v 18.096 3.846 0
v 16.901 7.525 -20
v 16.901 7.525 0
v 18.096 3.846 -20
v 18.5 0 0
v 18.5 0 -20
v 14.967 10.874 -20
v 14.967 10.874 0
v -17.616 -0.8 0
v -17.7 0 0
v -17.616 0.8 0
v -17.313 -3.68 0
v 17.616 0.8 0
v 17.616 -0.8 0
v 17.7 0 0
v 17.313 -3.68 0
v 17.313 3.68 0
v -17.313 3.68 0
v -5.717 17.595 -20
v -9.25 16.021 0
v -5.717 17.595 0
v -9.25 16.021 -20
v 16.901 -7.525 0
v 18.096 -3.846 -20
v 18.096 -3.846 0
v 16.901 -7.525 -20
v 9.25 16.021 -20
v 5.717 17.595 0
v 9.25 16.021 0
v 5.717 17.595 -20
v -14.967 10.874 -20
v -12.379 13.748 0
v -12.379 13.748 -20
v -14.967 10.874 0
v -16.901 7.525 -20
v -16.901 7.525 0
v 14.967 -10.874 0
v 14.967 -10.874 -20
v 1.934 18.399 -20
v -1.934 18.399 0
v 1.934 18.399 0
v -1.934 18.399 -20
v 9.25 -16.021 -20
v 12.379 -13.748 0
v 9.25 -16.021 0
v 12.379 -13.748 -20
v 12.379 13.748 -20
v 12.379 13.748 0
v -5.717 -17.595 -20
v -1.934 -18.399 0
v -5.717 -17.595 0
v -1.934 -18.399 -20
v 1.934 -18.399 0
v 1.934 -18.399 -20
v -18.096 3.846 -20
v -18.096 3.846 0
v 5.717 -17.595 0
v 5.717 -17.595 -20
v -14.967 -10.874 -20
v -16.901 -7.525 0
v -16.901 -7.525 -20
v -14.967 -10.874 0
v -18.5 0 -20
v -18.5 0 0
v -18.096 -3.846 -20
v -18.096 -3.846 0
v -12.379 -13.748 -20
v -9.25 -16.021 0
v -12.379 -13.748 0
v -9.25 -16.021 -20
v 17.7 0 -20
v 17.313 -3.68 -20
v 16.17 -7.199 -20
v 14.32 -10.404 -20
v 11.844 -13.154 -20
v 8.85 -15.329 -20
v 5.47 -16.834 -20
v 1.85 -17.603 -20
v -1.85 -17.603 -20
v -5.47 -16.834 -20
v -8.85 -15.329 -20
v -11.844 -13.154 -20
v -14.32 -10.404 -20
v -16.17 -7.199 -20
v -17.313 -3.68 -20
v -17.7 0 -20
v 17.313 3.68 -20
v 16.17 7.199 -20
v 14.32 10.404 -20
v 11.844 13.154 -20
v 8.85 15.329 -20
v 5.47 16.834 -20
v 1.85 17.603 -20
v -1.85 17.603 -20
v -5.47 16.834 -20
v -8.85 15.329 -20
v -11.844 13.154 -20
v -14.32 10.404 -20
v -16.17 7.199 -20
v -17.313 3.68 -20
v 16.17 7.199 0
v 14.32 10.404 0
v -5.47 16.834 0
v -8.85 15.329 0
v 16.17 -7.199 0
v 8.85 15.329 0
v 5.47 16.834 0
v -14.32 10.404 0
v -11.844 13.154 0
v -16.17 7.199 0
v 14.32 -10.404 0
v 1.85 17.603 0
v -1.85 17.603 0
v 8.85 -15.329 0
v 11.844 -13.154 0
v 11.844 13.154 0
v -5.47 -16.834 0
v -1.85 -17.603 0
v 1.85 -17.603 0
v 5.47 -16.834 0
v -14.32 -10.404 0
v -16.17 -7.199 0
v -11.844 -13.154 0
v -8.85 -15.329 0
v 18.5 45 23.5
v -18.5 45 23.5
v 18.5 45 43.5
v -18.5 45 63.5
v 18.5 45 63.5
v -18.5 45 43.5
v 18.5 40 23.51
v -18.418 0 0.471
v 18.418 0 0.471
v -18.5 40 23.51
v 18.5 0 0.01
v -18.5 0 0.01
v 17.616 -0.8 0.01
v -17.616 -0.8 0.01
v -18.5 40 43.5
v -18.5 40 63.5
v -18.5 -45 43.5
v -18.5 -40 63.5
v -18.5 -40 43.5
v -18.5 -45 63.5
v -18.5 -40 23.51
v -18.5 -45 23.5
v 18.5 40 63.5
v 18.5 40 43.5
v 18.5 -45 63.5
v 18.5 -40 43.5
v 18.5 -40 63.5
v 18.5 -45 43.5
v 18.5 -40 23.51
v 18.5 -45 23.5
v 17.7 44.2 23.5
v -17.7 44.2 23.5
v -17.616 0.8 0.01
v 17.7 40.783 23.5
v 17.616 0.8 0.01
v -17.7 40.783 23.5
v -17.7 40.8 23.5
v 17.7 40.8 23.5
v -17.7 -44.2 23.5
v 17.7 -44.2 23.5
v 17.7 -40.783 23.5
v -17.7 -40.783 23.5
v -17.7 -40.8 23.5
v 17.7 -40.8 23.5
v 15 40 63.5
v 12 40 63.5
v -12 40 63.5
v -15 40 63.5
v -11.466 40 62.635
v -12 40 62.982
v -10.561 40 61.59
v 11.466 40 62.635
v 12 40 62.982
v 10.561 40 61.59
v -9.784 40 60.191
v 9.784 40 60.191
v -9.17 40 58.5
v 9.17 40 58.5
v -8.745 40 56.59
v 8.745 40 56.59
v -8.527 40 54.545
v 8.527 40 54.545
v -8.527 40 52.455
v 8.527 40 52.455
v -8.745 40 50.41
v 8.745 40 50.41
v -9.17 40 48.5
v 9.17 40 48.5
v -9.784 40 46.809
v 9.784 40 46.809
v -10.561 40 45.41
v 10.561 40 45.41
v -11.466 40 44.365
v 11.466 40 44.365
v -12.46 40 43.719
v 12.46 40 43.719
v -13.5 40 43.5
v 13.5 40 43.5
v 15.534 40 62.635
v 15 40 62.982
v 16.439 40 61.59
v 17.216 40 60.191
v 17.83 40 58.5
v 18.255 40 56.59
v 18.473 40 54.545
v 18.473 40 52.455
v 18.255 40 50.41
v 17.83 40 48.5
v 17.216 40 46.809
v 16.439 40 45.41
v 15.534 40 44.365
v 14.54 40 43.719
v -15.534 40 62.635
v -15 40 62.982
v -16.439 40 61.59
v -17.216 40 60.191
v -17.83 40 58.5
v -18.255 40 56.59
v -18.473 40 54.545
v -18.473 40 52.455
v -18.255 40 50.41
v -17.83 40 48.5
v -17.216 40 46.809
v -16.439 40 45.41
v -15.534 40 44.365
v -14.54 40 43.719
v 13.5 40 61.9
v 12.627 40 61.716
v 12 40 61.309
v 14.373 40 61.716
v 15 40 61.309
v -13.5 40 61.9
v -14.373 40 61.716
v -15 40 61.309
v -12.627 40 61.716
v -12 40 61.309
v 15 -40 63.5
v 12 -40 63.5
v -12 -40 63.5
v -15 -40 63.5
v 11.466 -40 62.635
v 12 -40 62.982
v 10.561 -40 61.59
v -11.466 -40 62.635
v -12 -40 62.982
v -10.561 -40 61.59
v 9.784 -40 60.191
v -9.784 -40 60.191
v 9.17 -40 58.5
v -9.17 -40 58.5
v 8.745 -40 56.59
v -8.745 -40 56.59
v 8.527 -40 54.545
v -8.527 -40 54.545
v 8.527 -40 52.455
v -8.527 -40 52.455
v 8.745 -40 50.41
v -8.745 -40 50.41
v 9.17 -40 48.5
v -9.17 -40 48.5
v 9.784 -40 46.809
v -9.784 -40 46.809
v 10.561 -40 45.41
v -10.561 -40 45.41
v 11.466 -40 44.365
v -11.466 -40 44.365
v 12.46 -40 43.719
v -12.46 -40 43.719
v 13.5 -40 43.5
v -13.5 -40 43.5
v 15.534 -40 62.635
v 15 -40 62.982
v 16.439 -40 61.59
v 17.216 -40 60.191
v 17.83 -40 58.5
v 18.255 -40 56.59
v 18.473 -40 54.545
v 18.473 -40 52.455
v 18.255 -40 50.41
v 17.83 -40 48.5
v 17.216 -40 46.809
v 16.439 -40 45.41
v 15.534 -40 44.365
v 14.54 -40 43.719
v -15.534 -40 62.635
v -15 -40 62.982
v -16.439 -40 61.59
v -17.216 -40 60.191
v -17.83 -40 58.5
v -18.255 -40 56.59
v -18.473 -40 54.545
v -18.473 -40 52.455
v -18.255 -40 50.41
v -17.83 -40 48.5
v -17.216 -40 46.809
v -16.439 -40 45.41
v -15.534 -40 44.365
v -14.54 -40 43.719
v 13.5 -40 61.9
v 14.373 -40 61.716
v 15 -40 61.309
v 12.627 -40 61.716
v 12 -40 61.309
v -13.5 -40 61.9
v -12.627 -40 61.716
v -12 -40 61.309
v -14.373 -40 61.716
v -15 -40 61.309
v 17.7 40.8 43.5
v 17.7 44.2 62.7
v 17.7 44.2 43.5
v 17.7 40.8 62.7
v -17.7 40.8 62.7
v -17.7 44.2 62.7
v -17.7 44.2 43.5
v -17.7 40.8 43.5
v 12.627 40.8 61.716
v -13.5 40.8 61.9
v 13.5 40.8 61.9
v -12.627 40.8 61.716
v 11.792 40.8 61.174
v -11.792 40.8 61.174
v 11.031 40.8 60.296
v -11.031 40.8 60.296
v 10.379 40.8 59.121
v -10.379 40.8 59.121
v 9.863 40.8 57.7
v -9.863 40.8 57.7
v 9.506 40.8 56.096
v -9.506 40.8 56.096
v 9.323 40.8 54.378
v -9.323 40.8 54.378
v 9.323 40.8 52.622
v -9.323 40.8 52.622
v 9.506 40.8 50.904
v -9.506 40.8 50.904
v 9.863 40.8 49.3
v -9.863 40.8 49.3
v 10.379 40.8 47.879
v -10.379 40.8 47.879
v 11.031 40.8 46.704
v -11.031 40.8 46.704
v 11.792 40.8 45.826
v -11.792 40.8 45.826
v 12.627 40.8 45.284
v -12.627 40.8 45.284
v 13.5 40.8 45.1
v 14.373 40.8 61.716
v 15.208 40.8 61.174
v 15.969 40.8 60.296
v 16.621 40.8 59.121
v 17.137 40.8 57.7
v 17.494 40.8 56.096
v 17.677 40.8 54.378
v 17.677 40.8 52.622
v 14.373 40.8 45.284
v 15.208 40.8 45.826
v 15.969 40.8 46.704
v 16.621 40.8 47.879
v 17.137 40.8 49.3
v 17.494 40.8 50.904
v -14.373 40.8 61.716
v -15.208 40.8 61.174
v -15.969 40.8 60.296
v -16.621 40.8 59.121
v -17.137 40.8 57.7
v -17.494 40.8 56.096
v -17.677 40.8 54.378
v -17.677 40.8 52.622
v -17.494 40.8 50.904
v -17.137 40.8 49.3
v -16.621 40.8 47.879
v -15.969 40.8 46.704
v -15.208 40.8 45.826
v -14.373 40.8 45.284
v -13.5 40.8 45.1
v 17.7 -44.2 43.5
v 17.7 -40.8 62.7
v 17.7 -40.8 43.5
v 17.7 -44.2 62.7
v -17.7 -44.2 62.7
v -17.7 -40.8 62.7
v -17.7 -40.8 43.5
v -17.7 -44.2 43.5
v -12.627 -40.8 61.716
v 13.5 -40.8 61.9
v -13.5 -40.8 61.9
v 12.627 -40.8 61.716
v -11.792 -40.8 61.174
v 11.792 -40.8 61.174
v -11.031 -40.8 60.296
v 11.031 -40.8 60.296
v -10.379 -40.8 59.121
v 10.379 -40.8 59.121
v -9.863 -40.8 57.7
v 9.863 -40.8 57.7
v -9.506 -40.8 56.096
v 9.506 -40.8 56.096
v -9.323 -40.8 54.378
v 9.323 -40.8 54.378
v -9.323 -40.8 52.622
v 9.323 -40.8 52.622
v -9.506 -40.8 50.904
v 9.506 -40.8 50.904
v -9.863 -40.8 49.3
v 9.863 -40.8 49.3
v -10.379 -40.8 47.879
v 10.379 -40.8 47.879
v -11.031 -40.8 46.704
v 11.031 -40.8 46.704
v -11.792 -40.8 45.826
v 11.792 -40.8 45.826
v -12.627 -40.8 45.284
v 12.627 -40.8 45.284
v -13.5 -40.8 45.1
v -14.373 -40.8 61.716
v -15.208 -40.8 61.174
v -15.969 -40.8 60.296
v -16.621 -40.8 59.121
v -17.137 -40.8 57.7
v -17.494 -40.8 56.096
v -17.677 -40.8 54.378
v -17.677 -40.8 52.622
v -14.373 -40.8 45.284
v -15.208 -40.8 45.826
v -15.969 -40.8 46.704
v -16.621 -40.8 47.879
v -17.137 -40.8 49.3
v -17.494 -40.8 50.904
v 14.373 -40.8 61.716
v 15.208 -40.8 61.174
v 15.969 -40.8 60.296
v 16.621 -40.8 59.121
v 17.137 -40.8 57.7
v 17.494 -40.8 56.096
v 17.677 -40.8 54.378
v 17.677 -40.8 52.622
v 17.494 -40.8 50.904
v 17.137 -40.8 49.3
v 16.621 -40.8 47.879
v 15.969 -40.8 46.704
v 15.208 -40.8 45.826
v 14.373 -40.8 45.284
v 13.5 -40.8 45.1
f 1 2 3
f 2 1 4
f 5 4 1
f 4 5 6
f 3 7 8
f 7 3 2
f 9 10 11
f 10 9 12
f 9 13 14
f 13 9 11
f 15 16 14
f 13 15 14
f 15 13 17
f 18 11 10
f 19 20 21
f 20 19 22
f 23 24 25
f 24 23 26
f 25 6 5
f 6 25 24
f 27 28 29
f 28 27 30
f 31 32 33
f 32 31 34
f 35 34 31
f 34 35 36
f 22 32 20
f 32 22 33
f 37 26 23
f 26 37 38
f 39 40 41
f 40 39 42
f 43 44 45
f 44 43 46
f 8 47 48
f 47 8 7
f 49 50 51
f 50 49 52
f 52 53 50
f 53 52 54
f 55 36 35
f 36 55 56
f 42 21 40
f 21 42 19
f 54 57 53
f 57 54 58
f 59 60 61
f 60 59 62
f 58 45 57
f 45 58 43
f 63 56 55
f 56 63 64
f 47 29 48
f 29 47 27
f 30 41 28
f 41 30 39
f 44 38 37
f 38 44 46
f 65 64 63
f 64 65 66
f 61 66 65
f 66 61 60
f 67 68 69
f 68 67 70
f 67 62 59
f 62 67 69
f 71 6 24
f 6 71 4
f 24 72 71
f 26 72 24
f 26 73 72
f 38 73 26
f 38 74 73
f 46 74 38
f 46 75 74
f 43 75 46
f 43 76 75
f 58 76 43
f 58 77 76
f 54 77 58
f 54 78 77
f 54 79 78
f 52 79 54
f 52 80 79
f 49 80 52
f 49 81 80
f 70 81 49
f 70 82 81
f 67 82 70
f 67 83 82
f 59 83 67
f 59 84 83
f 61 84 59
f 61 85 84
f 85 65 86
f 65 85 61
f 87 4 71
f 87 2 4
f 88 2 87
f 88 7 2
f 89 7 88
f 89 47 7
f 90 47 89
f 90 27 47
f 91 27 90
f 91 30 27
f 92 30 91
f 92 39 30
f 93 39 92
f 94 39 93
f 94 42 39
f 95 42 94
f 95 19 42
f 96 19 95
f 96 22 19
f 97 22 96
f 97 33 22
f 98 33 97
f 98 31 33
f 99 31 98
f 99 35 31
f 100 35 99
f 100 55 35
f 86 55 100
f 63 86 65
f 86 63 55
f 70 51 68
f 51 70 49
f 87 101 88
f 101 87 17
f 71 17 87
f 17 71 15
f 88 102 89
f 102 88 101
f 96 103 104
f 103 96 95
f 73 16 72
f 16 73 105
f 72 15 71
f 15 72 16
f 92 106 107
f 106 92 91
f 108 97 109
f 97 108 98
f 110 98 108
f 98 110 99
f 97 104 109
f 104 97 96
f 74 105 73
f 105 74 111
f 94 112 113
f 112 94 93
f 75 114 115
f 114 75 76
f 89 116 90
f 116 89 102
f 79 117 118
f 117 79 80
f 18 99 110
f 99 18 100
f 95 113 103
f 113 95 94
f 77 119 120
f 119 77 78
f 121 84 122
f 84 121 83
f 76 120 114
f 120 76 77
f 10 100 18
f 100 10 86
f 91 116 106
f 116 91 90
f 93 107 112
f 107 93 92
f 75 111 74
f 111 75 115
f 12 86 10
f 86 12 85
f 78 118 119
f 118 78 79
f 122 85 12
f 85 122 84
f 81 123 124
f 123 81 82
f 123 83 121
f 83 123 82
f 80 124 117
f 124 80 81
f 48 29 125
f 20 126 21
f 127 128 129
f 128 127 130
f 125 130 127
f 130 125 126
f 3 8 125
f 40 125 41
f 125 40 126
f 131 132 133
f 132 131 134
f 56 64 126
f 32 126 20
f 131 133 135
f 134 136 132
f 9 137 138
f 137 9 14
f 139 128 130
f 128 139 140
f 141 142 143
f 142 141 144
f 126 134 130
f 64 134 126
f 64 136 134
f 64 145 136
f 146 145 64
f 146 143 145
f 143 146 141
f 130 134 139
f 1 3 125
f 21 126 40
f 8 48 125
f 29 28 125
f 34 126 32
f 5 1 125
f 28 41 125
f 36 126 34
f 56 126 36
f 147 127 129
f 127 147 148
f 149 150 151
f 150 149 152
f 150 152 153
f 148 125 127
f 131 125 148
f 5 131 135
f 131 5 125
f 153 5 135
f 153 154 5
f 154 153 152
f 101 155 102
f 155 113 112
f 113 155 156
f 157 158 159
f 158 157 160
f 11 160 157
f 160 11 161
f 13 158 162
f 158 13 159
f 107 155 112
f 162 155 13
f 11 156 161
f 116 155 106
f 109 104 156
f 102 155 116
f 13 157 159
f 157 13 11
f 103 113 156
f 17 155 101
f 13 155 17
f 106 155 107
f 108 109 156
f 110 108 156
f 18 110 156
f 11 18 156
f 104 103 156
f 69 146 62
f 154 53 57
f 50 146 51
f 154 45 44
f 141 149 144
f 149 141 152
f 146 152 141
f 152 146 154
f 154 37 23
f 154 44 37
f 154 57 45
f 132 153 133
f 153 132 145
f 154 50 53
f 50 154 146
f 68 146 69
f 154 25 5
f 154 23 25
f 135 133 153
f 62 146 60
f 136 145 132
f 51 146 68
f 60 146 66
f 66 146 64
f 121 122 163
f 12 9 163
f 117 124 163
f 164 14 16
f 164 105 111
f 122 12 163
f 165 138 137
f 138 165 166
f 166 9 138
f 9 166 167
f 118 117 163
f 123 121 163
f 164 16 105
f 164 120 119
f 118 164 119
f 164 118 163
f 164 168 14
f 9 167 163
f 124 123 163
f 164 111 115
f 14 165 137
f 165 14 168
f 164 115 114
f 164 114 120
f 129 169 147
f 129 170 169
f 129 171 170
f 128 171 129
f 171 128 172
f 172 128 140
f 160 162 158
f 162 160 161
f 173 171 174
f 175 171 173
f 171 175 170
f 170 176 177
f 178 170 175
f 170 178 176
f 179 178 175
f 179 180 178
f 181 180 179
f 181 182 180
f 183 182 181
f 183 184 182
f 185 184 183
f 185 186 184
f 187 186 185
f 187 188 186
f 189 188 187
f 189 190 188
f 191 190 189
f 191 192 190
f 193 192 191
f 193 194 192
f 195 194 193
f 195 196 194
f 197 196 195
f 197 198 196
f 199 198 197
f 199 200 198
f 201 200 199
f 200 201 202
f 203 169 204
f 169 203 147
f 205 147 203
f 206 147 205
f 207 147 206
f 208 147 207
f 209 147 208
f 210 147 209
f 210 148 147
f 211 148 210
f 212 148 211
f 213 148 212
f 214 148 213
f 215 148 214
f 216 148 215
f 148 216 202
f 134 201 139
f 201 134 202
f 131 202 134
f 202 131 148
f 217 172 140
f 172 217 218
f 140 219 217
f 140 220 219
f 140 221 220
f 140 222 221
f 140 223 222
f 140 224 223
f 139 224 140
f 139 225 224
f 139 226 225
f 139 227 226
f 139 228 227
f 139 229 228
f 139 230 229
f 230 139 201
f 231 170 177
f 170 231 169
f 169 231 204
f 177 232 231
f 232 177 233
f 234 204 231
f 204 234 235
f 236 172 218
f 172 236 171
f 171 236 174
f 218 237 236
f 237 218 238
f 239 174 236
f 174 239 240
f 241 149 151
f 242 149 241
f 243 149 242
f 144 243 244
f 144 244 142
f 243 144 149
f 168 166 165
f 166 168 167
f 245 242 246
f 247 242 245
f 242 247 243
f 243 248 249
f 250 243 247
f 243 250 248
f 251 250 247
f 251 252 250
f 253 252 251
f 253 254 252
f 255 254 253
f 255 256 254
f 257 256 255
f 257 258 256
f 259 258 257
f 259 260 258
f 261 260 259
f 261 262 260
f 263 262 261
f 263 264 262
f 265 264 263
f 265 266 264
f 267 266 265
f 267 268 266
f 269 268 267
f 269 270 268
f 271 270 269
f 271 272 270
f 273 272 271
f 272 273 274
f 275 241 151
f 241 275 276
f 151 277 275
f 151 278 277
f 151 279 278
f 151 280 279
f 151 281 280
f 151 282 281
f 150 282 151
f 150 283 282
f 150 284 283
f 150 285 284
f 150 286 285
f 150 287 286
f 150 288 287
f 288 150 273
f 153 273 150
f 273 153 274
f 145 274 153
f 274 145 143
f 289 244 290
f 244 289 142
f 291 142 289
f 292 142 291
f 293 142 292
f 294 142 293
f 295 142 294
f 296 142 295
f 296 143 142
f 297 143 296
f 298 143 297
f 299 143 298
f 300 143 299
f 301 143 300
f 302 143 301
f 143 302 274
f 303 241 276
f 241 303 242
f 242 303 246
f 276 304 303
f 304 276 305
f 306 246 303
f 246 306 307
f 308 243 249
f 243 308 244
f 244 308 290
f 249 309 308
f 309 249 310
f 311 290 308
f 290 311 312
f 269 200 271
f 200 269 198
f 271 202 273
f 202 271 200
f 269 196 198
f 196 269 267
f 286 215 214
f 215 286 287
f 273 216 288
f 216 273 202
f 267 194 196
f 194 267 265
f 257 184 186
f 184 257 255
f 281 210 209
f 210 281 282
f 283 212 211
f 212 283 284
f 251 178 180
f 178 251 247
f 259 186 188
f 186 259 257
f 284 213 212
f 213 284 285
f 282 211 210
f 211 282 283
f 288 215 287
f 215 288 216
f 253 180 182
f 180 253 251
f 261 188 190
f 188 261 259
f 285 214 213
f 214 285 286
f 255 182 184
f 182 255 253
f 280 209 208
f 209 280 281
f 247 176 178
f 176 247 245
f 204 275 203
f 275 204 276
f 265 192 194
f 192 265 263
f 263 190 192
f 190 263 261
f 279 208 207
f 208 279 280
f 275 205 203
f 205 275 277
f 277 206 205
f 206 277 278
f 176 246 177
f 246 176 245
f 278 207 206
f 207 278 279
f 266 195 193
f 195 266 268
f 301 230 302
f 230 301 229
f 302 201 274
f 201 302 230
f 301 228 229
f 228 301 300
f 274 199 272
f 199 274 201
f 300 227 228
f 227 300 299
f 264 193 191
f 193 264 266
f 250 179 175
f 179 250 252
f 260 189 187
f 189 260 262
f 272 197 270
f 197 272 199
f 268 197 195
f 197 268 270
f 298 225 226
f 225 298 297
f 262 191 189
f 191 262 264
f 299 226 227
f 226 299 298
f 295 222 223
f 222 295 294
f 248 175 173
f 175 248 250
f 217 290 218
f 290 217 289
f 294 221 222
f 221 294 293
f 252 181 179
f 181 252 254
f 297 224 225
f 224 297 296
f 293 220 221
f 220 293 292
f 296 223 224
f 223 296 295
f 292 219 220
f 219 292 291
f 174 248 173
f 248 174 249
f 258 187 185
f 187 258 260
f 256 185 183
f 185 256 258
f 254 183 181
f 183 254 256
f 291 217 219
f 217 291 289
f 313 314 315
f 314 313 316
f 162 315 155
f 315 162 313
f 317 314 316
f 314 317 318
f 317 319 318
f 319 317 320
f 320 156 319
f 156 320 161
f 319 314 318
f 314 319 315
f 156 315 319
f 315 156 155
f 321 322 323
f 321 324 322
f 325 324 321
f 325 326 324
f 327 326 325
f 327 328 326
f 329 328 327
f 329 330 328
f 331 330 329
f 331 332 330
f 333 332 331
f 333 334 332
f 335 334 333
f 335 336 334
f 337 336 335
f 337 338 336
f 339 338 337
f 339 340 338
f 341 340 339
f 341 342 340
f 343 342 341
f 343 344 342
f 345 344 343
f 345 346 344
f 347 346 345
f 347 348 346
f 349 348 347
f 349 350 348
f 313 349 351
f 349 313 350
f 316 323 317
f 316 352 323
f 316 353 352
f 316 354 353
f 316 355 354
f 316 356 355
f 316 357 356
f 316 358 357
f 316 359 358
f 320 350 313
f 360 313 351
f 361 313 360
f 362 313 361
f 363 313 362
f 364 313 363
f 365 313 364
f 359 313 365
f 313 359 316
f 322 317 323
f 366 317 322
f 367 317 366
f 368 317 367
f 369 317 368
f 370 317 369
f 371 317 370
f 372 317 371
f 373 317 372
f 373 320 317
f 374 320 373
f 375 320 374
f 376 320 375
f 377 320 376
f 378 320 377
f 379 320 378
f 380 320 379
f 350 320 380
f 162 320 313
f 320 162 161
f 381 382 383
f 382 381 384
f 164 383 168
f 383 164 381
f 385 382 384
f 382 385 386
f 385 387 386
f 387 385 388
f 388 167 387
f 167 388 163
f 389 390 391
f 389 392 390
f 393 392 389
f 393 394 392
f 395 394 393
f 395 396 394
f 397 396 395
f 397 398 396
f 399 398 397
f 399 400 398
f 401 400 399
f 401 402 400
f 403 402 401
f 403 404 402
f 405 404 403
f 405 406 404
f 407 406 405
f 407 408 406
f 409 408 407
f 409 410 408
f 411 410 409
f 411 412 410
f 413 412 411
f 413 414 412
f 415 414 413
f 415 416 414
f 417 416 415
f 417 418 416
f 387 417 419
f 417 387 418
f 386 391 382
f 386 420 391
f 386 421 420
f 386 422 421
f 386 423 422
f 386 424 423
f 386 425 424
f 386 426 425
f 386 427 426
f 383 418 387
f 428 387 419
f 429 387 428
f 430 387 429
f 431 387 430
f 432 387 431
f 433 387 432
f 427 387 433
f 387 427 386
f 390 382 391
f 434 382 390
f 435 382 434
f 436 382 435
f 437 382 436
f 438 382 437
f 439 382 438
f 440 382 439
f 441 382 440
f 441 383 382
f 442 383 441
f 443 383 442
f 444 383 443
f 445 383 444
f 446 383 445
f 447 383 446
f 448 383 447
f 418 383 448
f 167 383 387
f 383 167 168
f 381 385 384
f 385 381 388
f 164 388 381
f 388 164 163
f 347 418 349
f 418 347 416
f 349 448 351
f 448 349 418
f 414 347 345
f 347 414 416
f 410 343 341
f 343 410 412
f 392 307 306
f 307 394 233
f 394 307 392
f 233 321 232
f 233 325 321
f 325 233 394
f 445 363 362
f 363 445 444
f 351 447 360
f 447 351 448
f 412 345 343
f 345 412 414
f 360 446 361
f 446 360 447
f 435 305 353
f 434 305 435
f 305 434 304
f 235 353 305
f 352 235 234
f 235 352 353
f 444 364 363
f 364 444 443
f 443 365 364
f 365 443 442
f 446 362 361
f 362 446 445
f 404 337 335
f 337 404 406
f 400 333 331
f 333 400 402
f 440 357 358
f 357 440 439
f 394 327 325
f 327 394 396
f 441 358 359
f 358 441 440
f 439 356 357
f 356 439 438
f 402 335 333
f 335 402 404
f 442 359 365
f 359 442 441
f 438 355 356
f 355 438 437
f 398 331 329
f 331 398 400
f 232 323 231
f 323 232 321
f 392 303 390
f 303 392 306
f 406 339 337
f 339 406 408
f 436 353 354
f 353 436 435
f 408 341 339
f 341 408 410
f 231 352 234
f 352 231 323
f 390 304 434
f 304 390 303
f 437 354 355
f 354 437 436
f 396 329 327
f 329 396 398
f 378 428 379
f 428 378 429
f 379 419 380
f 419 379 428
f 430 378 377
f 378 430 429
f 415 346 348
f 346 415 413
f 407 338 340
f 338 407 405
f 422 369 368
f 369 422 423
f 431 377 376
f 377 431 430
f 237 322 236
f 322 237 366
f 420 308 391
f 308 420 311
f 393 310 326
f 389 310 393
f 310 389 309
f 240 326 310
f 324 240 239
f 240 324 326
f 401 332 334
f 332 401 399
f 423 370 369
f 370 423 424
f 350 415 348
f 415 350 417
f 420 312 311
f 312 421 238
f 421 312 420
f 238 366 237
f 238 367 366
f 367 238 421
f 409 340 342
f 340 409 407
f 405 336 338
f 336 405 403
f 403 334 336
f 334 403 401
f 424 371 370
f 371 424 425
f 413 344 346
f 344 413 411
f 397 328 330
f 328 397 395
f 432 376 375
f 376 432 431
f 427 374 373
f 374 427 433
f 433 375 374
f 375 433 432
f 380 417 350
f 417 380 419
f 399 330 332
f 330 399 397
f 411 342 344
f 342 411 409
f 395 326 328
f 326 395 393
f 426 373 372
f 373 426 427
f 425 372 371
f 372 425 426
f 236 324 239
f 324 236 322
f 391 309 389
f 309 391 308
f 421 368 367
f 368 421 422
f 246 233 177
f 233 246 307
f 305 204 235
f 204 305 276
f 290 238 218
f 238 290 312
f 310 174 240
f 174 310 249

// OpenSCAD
$fn=30;
nothing=0.01;
wall=0.8;
cylH=20;
cylR=37/2;
fanW=80;
fanH=20;
jetH=20;
poleW=5;
gap=3;
printTop=1;
printBottom=1;

if(printTop){
	size=fanW+2*poleW+2*nothing;
	difference(){
		output();		
		translate([-size/2,-size/2,fanH+cylR+poleW-size]) cube([size,size,size]);
	}
}

if(printBottom){
	size=fanW+2*poleW+2*nothing;
	difference(){
		output();		
		translate([-size/2,-size/2,fanH+cylR+poleW]) cube([size,size,size]);
	}
}


module output(){
	tube();
	difference(){
		manifold();
		translate([cylR-jetH/4+gap/2,-fanW/2,fanH+jetH/2+cylR+poleW]) rotate([0,0,90]) cube([fanW,gap,jetH]);
		translate([-(cylR-jetH/4)+gap/2,-fanW/2,fanH+jetH/2+cylR+poleW]) rotate([0,0,90]) cube([fanW,gap,jetH]);
	}
}


module manifold(){
	difference(){
		union(){
			funnel();
//			//triangles
//			//translate([-cylR,fanW/2,0]) rotate([0,-90,90]) triangle(width=1.8*cylR,height=fanW );
//			rotate([0,0,180]) translate([-cylR,fanW/2,0]) rotate([0,-90,90]) triangle(width=1.8*cylR,height=fanW );
//
//		translate([-cylR,fanW/2,0]) rotate([0,-90,90]) triangleHole(width=1.8*cylR,height=fanW );

			
			//poles
			translate([-cylR,fanW/2,cylR+poleW]) cube([2*cylR,poleW,fanH+jetH]);
			translate([-cylR,-fanW/2-poleW,cylR+poleW]) cube([2*cylR,poleW,fanH+jetH]);



			//jets
			translate([cylR-jetH/4,0,fanH+jetH/2+cylR+poleW]) rotate([0,0,90]) jet(width=fanW,height=jetH);
			translate([-(cylR-jetH/4),0,fanH+jetH/2+cylR+poleW]) rotate([0,0,90]) jet(width=fanW,height=jetH);
		}

		//triangle holes
		//translate([-cylR,fanW/2,0]) rotate([0,-90,90]) triangleHole(width=1.8*cylR,height=fanW );
		//rotate([0,0,180]) translate([-cylR,fanW/2,0]) rotate([0,-90,90]) triangle(width=1.8*cylR,height=fanW );

//		//pole holes
		translate([-cylR+wall,fanW/2+wall,cylR+poleW]) cube([2*cylR-2*wall,poleW-2*wall,fanH+jetH-wall]);
		translate([-cylR+wall,-fanW/2-poleW+wall,cylR+poleW]) cube([2*cylR-2*wall,poleW-2*wall,fanH+jetH-wall]);
		//translate([-cylR+wall,fanW/2+wall,wall]) cube([poleW-2*wall,poleW-2*wall,1.8*cylR+fanH+jetH-2*wall]);
//		translate([-cylR+wall,-fanW/2-poleW+wall,wall]) cube([poleW-2*wall,poleW-2*wall,1.8*cylR+fanH+jetH-2*wall]);
//		translate([cylR-poleW+wall,fanW/2+wall,wall]) cube([poleW-2*wall,poleW-2*wall,1.8*cylR+fanH+jetH-2*wall]);
//		translate([cylR-poleW+wall,-fanW/2-poleW+wall,wall]) cube([poleW-2*wall,poleW-2*wall,1.8*cylR+fanH+jetH-2*wall]);
		
		//jet holes
		translate([cylR-jetH/4,0,fanH+jetH/2+cylR+poleW]) rotate([0,0,90]) jetHole(width=fanW,height=jetH);
		translate([-(cylR-jetH/4),0,fanH+jetH/2+cylR+poleW]) rotate([0,0,90]) jetHole(width=fanW,height=jetH);
	}

}

module triangle(width = 10, height = 5){
	difference(){
		translate([width/3,0,0]) cylinder(h=height, d=width/.75, $fn=3);
		translate([-nothing,0,-nothing]) cube([width,width,height+2*nothing]);
	}
}

module triangleHole(width = 10, height = 5){
	difference(){
		translate([width/3-wall,0,wall]) cylinder(h=height-2*wall, d=(width-3*wall)/.75, $fn=3);
		translate([-nothing,0,-nothing]) cube([width,width,height+2*nothing]);
	}
}

module tube(){
	translate([0,0,-cylH]) difference(){
		cylinder(h=cylH, r=cylR);
		translate([0,0,-nothing]) cylinder(h=cylH+2*nothing, r=cylR-wall);
	}
}

module jet(width = 100, height = 10){
	difference(){
		translate([-width/2,0,0]) rotate([0,90,0]) scale([1,0.5,1]) cylinder(h=width,r=height/2);
	}
}

module jetHole(width = 100, height = 10){
	difference(){
		translate([-width/2-wall*1.5,0,0]) rotate([0,90,0]) scale([1,0.5,1]) cylinder(h=width+3*wall,r=height/2-2*wall);
	}
}

module funnel(){
	difference(){
		hull(){
			difference(){
				cylinder(h=nothing, r=cylR);
				translate([-cylR,-cylR-wall,0]) cube([2*cylR,cylR,2*nothing]);
			}
			translate([-cylR,fanW/2,cylR+poleW]) cube([2*cylR,poleW,nothing]);		
		}
		
		hull(){
			difference(){
				cylinder(h=nothing, r=cylR-wall);
				translate([-cylR,-cylR+wall,0]) cube([2*cylR,cylR,2*nothing]);
			}
			translate([-cylR+wall,fanW/2+wall,cylR+poleW]) cube([2*cylR-2*wall,poleW-2*wall,nothing]);		
		}
	}

	difference(){
		hull(){
			difference(){
				cylinder(h=nothing, r=cylR);
				translate([-cylR,wall,0]) cube([2*cylR,cylR,2*nothing]);
			}
			translate([-cylR,-fanW/2-poleW,cylR+poleW]) cube([2*cylR,poleW,nothing]);
		}

		hull(){
			difference(){
				cylinder(h=nothing, r=cylR-wall);
				translate([-cylR,-wall,0]) cube([2*cylR,cylR,2*nothing]);
			}
			translate([-cylR+wall,-fanW/2-poleW+wall,cylR+poleW]) cube([2*cylR-2*wall,poleW-2*wall,nothing]);
		}
	}
}
